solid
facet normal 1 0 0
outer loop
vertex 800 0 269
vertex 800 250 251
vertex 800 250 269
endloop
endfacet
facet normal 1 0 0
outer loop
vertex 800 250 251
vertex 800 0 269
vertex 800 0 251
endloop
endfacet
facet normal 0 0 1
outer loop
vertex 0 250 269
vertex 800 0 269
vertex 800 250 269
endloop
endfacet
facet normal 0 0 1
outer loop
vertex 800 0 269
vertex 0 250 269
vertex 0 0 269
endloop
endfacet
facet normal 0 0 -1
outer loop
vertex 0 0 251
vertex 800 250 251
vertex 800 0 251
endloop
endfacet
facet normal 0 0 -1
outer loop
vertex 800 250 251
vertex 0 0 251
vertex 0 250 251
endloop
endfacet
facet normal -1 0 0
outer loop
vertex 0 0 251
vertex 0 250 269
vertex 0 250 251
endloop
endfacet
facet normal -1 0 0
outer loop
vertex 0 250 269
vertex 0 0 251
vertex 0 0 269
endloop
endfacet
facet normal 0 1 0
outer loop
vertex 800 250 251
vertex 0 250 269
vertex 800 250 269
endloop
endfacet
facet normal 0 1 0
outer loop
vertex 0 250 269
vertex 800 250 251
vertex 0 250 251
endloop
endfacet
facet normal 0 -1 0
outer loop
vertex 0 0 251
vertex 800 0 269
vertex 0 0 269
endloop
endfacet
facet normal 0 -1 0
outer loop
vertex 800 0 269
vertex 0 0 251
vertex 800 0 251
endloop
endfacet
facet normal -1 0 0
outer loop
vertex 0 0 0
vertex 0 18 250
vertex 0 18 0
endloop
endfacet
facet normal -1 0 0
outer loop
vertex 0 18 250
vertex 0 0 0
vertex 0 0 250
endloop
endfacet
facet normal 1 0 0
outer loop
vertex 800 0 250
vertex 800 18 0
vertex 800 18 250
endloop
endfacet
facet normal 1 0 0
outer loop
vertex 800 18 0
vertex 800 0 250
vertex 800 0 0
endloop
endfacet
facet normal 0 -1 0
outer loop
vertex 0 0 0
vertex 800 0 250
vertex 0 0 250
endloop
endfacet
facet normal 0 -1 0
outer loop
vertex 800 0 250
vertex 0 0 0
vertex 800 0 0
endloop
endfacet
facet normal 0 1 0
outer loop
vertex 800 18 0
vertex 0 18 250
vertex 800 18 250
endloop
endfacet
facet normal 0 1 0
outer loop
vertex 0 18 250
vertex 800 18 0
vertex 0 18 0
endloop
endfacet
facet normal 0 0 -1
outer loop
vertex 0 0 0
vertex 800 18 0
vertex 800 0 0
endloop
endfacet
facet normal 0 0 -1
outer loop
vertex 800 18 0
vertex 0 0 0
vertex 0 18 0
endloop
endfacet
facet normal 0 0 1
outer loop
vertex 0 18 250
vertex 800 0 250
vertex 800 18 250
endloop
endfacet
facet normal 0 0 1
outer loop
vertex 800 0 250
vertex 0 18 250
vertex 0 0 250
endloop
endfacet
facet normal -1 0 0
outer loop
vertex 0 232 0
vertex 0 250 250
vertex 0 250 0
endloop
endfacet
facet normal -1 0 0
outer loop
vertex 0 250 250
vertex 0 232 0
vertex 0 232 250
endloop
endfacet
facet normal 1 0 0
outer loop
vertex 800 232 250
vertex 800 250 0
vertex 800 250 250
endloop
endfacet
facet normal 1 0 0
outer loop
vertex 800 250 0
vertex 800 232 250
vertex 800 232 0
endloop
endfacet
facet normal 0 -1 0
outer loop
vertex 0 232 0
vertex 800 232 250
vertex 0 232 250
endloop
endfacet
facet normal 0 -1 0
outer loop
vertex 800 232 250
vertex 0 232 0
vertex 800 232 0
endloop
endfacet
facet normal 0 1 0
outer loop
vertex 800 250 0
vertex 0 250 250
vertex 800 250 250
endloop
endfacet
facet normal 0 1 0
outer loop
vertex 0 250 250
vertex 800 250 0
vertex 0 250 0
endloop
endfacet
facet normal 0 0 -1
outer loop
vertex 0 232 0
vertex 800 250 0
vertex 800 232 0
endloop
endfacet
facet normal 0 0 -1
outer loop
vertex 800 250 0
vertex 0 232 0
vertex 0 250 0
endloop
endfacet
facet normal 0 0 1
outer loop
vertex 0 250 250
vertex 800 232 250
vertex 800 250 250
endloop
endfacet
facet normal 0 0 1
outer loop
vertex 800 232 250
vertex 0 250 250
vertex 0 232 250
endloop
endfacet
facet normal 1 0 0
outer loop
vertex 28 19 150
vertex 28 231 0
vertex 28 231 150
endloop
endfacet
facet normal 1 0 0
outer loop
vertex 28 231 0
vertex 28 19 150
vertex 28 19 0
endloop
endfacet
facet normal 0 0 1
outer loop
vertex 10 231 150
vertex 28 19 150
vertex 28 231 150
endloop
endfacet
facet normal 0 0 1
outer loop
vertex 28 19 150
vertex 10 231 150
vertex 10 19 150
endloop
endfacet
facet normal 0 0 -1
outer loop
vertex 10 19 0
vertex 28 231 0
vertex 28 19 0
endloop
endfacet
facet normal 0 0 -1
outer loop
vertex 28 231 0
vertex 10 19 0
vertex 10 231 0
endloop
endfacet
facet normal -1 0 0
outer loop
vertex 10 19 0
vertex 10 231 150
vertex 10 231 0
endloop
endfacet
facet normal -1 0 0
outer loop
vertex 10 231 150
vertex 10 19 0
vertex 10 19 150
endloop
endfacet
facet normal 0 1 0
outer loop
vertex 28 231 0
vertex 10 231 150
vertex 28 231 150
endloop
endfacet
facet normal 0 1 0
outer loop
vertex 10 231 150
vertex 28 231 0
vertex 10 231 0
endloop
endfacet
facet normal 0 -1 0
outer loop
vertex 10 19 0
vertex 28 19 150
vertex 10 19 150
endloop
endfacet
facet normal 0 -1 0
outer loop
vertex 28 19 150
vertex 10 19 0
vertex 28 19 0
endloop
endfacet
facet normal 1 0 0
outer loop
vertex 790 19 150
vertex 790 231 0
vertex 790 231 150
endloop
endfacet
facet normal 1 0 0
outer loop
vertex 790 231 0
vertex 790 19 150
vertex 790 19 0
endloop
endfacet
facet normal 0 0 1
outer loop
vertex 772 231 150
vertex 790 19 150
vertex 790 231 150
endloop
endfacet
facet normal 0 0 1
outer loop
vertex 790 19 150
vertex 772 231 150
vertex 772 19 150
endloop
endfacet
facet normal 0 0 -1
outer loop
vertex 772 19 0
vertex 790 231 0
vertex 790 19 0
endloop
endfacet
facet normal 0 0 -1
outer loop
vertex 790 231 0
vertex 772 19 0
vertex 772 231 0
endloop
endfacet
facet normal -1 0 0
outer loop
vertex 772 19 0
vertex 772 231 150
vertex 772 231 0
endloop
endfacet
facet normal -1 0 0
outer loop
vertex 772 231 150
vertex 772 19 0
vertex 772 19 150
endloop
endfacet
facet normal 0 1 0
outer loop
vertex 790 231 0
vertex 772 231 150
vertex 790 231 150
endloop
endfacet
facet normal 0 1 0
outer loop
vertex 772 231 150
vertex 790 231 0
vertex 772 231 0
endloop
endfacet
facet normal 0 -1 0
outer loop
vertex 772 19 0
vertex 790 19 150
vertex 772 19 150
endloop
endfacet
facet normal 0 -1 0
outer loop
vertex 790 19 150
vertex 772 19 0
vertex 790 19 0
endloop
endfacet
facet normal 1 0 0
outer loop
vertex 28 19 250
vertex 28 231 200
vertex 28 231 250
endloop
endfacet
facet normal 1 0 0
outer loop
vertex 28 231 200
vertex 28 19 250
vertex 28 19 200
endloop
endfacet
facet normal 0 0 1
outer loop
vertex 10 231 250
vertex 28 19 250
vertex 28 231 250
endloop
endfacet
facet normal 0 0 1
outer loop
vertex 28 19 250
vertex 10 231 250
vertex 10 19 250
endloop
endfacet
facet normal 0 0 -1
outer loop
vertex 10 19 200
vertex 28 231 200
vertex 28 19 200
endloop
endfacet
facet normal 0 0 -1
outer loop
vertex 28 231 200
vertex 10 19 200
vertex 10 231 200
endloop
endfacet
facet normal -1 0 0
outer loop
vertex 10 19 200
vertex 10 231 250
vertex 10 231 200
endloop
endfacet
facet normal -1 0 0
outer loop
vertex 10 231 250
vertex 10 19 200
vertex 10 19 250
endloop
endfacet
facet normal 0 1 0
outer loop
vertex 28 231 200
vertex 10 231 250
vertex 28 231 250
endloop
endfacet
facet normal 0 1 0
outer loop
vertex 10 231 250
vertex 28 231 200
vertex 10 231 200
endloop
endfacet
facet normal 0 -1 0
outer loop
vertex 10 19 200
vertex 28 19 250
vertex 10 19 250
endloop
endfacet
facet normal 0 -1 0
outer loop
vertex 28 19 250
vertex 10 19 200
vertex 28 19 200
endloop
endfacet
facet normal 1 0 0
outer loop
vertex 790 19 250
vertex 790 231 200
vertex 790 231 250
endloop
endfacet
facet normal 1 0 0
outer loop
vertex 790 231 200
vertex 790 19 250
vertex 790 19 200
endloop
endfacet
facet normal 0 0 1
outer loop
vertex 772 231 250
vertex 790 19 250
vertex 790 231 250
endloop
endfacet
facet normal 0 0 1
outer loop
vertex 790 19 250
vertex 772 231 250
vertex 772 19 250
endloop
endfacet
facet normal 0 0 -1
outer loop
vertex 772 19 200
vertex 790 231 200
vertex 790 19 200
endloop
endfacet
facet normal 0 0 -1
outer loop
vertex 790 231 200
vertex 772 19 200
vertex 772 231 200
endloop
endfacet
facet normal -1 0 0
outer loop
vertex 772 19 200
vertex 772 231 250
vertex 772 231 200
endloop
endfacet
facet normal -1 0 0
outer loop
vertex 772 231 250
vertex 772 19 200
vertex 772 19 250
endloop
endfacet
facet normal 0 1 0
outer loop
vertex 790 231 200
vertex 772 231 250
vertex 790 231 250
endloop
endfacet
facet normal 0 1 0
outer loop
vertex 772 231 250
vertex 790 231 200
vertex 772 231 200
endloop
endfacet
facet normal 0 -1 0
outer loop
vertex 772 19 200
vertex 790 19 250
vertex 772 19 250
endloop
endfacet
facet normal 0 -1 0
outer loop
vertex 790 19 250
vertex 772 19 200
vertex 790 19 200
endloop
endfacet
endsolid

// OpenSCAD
W  =  250;
L2 =  800;
L1 = 1200;
T  =   18;
W2 = W - T * 2;

SP = 1;

module bench1() {
    L = L1 - W*2;
    echo(L);
    translate([0, 0, W+SP]) cube([L, W, T]);

    translate([0, T, 0]) rotate([90, 0, 0]) cube([L, W, T]);
    translate([0, W, 0]) rotate([90, 0, 0]) cube([L, W, T]);

    translate([0, T+SP, 0]) cube([T, W2 - SP*2, W]);
    translate([L-T, T+SP, 0]) cube([T, W2 - SP*2, W]);
}

module bench2() {
    L = L2;
    echo(L);
    translate([0, 0, W+SP]) cube([L, W, T]);

    translate([0, T, 0]) rotate([90, 0, 0]) cube([L, W, T]);
    translate([0, W, 0]) rotate([90, 0, 0]) cube([L, W, T]);

    p = .75;
    q = 1-p;
    d = 10;
    H2p = (L1-L)/2*p;
    H2q = (L1-L)/2*q;
    echo(H2p, H2q);
    translate([0+d, T+SP, 0])   cube([T, W2 - SP*2, H2p]);
    translate([L-T-d, T+SP, 0]) cube([T, W2 - SP*2, H2p]);

    translate([0+d, T+SP, W-H2q])   cube([T, W2 - SP*2, H2q]);
    translate([L-T-d, T+SP, W-H2q]) cube([T, W2 - SP*2, H2q]);
}

module bench3() {
    L = L2;
    echo(L);
    translate([0, 0, W+SP]) cube([L, W, T]);

    translate([0, T, 0]) rotate([90, 0, 0]) cube([L, W, T]);
    translate([0, W, 0]) rotate([90, 0, 0]) cube([L, W, T]);

    d = 5;
    H2 = (L1-L)/2;
    echo(H2);
    translate([0+d,   T+SP, 0]) cube([T, W2 - SP*2, H2]);
    translate([L-T-d, T+SP, 0]) cube([T, W2 - SP*2, H2]);

    H3 = T*2 - 4;
    W3 = H2;
    echo(W2-W3);
    translate([0+d,   T+SP, W-H3]) cube([T, W3 - SP*2, H3]);
    translate([L-T-d, T+SP, W-H3]) cube([T, W3 - SP*2, H3]);
}

color("orange")

bench2();
